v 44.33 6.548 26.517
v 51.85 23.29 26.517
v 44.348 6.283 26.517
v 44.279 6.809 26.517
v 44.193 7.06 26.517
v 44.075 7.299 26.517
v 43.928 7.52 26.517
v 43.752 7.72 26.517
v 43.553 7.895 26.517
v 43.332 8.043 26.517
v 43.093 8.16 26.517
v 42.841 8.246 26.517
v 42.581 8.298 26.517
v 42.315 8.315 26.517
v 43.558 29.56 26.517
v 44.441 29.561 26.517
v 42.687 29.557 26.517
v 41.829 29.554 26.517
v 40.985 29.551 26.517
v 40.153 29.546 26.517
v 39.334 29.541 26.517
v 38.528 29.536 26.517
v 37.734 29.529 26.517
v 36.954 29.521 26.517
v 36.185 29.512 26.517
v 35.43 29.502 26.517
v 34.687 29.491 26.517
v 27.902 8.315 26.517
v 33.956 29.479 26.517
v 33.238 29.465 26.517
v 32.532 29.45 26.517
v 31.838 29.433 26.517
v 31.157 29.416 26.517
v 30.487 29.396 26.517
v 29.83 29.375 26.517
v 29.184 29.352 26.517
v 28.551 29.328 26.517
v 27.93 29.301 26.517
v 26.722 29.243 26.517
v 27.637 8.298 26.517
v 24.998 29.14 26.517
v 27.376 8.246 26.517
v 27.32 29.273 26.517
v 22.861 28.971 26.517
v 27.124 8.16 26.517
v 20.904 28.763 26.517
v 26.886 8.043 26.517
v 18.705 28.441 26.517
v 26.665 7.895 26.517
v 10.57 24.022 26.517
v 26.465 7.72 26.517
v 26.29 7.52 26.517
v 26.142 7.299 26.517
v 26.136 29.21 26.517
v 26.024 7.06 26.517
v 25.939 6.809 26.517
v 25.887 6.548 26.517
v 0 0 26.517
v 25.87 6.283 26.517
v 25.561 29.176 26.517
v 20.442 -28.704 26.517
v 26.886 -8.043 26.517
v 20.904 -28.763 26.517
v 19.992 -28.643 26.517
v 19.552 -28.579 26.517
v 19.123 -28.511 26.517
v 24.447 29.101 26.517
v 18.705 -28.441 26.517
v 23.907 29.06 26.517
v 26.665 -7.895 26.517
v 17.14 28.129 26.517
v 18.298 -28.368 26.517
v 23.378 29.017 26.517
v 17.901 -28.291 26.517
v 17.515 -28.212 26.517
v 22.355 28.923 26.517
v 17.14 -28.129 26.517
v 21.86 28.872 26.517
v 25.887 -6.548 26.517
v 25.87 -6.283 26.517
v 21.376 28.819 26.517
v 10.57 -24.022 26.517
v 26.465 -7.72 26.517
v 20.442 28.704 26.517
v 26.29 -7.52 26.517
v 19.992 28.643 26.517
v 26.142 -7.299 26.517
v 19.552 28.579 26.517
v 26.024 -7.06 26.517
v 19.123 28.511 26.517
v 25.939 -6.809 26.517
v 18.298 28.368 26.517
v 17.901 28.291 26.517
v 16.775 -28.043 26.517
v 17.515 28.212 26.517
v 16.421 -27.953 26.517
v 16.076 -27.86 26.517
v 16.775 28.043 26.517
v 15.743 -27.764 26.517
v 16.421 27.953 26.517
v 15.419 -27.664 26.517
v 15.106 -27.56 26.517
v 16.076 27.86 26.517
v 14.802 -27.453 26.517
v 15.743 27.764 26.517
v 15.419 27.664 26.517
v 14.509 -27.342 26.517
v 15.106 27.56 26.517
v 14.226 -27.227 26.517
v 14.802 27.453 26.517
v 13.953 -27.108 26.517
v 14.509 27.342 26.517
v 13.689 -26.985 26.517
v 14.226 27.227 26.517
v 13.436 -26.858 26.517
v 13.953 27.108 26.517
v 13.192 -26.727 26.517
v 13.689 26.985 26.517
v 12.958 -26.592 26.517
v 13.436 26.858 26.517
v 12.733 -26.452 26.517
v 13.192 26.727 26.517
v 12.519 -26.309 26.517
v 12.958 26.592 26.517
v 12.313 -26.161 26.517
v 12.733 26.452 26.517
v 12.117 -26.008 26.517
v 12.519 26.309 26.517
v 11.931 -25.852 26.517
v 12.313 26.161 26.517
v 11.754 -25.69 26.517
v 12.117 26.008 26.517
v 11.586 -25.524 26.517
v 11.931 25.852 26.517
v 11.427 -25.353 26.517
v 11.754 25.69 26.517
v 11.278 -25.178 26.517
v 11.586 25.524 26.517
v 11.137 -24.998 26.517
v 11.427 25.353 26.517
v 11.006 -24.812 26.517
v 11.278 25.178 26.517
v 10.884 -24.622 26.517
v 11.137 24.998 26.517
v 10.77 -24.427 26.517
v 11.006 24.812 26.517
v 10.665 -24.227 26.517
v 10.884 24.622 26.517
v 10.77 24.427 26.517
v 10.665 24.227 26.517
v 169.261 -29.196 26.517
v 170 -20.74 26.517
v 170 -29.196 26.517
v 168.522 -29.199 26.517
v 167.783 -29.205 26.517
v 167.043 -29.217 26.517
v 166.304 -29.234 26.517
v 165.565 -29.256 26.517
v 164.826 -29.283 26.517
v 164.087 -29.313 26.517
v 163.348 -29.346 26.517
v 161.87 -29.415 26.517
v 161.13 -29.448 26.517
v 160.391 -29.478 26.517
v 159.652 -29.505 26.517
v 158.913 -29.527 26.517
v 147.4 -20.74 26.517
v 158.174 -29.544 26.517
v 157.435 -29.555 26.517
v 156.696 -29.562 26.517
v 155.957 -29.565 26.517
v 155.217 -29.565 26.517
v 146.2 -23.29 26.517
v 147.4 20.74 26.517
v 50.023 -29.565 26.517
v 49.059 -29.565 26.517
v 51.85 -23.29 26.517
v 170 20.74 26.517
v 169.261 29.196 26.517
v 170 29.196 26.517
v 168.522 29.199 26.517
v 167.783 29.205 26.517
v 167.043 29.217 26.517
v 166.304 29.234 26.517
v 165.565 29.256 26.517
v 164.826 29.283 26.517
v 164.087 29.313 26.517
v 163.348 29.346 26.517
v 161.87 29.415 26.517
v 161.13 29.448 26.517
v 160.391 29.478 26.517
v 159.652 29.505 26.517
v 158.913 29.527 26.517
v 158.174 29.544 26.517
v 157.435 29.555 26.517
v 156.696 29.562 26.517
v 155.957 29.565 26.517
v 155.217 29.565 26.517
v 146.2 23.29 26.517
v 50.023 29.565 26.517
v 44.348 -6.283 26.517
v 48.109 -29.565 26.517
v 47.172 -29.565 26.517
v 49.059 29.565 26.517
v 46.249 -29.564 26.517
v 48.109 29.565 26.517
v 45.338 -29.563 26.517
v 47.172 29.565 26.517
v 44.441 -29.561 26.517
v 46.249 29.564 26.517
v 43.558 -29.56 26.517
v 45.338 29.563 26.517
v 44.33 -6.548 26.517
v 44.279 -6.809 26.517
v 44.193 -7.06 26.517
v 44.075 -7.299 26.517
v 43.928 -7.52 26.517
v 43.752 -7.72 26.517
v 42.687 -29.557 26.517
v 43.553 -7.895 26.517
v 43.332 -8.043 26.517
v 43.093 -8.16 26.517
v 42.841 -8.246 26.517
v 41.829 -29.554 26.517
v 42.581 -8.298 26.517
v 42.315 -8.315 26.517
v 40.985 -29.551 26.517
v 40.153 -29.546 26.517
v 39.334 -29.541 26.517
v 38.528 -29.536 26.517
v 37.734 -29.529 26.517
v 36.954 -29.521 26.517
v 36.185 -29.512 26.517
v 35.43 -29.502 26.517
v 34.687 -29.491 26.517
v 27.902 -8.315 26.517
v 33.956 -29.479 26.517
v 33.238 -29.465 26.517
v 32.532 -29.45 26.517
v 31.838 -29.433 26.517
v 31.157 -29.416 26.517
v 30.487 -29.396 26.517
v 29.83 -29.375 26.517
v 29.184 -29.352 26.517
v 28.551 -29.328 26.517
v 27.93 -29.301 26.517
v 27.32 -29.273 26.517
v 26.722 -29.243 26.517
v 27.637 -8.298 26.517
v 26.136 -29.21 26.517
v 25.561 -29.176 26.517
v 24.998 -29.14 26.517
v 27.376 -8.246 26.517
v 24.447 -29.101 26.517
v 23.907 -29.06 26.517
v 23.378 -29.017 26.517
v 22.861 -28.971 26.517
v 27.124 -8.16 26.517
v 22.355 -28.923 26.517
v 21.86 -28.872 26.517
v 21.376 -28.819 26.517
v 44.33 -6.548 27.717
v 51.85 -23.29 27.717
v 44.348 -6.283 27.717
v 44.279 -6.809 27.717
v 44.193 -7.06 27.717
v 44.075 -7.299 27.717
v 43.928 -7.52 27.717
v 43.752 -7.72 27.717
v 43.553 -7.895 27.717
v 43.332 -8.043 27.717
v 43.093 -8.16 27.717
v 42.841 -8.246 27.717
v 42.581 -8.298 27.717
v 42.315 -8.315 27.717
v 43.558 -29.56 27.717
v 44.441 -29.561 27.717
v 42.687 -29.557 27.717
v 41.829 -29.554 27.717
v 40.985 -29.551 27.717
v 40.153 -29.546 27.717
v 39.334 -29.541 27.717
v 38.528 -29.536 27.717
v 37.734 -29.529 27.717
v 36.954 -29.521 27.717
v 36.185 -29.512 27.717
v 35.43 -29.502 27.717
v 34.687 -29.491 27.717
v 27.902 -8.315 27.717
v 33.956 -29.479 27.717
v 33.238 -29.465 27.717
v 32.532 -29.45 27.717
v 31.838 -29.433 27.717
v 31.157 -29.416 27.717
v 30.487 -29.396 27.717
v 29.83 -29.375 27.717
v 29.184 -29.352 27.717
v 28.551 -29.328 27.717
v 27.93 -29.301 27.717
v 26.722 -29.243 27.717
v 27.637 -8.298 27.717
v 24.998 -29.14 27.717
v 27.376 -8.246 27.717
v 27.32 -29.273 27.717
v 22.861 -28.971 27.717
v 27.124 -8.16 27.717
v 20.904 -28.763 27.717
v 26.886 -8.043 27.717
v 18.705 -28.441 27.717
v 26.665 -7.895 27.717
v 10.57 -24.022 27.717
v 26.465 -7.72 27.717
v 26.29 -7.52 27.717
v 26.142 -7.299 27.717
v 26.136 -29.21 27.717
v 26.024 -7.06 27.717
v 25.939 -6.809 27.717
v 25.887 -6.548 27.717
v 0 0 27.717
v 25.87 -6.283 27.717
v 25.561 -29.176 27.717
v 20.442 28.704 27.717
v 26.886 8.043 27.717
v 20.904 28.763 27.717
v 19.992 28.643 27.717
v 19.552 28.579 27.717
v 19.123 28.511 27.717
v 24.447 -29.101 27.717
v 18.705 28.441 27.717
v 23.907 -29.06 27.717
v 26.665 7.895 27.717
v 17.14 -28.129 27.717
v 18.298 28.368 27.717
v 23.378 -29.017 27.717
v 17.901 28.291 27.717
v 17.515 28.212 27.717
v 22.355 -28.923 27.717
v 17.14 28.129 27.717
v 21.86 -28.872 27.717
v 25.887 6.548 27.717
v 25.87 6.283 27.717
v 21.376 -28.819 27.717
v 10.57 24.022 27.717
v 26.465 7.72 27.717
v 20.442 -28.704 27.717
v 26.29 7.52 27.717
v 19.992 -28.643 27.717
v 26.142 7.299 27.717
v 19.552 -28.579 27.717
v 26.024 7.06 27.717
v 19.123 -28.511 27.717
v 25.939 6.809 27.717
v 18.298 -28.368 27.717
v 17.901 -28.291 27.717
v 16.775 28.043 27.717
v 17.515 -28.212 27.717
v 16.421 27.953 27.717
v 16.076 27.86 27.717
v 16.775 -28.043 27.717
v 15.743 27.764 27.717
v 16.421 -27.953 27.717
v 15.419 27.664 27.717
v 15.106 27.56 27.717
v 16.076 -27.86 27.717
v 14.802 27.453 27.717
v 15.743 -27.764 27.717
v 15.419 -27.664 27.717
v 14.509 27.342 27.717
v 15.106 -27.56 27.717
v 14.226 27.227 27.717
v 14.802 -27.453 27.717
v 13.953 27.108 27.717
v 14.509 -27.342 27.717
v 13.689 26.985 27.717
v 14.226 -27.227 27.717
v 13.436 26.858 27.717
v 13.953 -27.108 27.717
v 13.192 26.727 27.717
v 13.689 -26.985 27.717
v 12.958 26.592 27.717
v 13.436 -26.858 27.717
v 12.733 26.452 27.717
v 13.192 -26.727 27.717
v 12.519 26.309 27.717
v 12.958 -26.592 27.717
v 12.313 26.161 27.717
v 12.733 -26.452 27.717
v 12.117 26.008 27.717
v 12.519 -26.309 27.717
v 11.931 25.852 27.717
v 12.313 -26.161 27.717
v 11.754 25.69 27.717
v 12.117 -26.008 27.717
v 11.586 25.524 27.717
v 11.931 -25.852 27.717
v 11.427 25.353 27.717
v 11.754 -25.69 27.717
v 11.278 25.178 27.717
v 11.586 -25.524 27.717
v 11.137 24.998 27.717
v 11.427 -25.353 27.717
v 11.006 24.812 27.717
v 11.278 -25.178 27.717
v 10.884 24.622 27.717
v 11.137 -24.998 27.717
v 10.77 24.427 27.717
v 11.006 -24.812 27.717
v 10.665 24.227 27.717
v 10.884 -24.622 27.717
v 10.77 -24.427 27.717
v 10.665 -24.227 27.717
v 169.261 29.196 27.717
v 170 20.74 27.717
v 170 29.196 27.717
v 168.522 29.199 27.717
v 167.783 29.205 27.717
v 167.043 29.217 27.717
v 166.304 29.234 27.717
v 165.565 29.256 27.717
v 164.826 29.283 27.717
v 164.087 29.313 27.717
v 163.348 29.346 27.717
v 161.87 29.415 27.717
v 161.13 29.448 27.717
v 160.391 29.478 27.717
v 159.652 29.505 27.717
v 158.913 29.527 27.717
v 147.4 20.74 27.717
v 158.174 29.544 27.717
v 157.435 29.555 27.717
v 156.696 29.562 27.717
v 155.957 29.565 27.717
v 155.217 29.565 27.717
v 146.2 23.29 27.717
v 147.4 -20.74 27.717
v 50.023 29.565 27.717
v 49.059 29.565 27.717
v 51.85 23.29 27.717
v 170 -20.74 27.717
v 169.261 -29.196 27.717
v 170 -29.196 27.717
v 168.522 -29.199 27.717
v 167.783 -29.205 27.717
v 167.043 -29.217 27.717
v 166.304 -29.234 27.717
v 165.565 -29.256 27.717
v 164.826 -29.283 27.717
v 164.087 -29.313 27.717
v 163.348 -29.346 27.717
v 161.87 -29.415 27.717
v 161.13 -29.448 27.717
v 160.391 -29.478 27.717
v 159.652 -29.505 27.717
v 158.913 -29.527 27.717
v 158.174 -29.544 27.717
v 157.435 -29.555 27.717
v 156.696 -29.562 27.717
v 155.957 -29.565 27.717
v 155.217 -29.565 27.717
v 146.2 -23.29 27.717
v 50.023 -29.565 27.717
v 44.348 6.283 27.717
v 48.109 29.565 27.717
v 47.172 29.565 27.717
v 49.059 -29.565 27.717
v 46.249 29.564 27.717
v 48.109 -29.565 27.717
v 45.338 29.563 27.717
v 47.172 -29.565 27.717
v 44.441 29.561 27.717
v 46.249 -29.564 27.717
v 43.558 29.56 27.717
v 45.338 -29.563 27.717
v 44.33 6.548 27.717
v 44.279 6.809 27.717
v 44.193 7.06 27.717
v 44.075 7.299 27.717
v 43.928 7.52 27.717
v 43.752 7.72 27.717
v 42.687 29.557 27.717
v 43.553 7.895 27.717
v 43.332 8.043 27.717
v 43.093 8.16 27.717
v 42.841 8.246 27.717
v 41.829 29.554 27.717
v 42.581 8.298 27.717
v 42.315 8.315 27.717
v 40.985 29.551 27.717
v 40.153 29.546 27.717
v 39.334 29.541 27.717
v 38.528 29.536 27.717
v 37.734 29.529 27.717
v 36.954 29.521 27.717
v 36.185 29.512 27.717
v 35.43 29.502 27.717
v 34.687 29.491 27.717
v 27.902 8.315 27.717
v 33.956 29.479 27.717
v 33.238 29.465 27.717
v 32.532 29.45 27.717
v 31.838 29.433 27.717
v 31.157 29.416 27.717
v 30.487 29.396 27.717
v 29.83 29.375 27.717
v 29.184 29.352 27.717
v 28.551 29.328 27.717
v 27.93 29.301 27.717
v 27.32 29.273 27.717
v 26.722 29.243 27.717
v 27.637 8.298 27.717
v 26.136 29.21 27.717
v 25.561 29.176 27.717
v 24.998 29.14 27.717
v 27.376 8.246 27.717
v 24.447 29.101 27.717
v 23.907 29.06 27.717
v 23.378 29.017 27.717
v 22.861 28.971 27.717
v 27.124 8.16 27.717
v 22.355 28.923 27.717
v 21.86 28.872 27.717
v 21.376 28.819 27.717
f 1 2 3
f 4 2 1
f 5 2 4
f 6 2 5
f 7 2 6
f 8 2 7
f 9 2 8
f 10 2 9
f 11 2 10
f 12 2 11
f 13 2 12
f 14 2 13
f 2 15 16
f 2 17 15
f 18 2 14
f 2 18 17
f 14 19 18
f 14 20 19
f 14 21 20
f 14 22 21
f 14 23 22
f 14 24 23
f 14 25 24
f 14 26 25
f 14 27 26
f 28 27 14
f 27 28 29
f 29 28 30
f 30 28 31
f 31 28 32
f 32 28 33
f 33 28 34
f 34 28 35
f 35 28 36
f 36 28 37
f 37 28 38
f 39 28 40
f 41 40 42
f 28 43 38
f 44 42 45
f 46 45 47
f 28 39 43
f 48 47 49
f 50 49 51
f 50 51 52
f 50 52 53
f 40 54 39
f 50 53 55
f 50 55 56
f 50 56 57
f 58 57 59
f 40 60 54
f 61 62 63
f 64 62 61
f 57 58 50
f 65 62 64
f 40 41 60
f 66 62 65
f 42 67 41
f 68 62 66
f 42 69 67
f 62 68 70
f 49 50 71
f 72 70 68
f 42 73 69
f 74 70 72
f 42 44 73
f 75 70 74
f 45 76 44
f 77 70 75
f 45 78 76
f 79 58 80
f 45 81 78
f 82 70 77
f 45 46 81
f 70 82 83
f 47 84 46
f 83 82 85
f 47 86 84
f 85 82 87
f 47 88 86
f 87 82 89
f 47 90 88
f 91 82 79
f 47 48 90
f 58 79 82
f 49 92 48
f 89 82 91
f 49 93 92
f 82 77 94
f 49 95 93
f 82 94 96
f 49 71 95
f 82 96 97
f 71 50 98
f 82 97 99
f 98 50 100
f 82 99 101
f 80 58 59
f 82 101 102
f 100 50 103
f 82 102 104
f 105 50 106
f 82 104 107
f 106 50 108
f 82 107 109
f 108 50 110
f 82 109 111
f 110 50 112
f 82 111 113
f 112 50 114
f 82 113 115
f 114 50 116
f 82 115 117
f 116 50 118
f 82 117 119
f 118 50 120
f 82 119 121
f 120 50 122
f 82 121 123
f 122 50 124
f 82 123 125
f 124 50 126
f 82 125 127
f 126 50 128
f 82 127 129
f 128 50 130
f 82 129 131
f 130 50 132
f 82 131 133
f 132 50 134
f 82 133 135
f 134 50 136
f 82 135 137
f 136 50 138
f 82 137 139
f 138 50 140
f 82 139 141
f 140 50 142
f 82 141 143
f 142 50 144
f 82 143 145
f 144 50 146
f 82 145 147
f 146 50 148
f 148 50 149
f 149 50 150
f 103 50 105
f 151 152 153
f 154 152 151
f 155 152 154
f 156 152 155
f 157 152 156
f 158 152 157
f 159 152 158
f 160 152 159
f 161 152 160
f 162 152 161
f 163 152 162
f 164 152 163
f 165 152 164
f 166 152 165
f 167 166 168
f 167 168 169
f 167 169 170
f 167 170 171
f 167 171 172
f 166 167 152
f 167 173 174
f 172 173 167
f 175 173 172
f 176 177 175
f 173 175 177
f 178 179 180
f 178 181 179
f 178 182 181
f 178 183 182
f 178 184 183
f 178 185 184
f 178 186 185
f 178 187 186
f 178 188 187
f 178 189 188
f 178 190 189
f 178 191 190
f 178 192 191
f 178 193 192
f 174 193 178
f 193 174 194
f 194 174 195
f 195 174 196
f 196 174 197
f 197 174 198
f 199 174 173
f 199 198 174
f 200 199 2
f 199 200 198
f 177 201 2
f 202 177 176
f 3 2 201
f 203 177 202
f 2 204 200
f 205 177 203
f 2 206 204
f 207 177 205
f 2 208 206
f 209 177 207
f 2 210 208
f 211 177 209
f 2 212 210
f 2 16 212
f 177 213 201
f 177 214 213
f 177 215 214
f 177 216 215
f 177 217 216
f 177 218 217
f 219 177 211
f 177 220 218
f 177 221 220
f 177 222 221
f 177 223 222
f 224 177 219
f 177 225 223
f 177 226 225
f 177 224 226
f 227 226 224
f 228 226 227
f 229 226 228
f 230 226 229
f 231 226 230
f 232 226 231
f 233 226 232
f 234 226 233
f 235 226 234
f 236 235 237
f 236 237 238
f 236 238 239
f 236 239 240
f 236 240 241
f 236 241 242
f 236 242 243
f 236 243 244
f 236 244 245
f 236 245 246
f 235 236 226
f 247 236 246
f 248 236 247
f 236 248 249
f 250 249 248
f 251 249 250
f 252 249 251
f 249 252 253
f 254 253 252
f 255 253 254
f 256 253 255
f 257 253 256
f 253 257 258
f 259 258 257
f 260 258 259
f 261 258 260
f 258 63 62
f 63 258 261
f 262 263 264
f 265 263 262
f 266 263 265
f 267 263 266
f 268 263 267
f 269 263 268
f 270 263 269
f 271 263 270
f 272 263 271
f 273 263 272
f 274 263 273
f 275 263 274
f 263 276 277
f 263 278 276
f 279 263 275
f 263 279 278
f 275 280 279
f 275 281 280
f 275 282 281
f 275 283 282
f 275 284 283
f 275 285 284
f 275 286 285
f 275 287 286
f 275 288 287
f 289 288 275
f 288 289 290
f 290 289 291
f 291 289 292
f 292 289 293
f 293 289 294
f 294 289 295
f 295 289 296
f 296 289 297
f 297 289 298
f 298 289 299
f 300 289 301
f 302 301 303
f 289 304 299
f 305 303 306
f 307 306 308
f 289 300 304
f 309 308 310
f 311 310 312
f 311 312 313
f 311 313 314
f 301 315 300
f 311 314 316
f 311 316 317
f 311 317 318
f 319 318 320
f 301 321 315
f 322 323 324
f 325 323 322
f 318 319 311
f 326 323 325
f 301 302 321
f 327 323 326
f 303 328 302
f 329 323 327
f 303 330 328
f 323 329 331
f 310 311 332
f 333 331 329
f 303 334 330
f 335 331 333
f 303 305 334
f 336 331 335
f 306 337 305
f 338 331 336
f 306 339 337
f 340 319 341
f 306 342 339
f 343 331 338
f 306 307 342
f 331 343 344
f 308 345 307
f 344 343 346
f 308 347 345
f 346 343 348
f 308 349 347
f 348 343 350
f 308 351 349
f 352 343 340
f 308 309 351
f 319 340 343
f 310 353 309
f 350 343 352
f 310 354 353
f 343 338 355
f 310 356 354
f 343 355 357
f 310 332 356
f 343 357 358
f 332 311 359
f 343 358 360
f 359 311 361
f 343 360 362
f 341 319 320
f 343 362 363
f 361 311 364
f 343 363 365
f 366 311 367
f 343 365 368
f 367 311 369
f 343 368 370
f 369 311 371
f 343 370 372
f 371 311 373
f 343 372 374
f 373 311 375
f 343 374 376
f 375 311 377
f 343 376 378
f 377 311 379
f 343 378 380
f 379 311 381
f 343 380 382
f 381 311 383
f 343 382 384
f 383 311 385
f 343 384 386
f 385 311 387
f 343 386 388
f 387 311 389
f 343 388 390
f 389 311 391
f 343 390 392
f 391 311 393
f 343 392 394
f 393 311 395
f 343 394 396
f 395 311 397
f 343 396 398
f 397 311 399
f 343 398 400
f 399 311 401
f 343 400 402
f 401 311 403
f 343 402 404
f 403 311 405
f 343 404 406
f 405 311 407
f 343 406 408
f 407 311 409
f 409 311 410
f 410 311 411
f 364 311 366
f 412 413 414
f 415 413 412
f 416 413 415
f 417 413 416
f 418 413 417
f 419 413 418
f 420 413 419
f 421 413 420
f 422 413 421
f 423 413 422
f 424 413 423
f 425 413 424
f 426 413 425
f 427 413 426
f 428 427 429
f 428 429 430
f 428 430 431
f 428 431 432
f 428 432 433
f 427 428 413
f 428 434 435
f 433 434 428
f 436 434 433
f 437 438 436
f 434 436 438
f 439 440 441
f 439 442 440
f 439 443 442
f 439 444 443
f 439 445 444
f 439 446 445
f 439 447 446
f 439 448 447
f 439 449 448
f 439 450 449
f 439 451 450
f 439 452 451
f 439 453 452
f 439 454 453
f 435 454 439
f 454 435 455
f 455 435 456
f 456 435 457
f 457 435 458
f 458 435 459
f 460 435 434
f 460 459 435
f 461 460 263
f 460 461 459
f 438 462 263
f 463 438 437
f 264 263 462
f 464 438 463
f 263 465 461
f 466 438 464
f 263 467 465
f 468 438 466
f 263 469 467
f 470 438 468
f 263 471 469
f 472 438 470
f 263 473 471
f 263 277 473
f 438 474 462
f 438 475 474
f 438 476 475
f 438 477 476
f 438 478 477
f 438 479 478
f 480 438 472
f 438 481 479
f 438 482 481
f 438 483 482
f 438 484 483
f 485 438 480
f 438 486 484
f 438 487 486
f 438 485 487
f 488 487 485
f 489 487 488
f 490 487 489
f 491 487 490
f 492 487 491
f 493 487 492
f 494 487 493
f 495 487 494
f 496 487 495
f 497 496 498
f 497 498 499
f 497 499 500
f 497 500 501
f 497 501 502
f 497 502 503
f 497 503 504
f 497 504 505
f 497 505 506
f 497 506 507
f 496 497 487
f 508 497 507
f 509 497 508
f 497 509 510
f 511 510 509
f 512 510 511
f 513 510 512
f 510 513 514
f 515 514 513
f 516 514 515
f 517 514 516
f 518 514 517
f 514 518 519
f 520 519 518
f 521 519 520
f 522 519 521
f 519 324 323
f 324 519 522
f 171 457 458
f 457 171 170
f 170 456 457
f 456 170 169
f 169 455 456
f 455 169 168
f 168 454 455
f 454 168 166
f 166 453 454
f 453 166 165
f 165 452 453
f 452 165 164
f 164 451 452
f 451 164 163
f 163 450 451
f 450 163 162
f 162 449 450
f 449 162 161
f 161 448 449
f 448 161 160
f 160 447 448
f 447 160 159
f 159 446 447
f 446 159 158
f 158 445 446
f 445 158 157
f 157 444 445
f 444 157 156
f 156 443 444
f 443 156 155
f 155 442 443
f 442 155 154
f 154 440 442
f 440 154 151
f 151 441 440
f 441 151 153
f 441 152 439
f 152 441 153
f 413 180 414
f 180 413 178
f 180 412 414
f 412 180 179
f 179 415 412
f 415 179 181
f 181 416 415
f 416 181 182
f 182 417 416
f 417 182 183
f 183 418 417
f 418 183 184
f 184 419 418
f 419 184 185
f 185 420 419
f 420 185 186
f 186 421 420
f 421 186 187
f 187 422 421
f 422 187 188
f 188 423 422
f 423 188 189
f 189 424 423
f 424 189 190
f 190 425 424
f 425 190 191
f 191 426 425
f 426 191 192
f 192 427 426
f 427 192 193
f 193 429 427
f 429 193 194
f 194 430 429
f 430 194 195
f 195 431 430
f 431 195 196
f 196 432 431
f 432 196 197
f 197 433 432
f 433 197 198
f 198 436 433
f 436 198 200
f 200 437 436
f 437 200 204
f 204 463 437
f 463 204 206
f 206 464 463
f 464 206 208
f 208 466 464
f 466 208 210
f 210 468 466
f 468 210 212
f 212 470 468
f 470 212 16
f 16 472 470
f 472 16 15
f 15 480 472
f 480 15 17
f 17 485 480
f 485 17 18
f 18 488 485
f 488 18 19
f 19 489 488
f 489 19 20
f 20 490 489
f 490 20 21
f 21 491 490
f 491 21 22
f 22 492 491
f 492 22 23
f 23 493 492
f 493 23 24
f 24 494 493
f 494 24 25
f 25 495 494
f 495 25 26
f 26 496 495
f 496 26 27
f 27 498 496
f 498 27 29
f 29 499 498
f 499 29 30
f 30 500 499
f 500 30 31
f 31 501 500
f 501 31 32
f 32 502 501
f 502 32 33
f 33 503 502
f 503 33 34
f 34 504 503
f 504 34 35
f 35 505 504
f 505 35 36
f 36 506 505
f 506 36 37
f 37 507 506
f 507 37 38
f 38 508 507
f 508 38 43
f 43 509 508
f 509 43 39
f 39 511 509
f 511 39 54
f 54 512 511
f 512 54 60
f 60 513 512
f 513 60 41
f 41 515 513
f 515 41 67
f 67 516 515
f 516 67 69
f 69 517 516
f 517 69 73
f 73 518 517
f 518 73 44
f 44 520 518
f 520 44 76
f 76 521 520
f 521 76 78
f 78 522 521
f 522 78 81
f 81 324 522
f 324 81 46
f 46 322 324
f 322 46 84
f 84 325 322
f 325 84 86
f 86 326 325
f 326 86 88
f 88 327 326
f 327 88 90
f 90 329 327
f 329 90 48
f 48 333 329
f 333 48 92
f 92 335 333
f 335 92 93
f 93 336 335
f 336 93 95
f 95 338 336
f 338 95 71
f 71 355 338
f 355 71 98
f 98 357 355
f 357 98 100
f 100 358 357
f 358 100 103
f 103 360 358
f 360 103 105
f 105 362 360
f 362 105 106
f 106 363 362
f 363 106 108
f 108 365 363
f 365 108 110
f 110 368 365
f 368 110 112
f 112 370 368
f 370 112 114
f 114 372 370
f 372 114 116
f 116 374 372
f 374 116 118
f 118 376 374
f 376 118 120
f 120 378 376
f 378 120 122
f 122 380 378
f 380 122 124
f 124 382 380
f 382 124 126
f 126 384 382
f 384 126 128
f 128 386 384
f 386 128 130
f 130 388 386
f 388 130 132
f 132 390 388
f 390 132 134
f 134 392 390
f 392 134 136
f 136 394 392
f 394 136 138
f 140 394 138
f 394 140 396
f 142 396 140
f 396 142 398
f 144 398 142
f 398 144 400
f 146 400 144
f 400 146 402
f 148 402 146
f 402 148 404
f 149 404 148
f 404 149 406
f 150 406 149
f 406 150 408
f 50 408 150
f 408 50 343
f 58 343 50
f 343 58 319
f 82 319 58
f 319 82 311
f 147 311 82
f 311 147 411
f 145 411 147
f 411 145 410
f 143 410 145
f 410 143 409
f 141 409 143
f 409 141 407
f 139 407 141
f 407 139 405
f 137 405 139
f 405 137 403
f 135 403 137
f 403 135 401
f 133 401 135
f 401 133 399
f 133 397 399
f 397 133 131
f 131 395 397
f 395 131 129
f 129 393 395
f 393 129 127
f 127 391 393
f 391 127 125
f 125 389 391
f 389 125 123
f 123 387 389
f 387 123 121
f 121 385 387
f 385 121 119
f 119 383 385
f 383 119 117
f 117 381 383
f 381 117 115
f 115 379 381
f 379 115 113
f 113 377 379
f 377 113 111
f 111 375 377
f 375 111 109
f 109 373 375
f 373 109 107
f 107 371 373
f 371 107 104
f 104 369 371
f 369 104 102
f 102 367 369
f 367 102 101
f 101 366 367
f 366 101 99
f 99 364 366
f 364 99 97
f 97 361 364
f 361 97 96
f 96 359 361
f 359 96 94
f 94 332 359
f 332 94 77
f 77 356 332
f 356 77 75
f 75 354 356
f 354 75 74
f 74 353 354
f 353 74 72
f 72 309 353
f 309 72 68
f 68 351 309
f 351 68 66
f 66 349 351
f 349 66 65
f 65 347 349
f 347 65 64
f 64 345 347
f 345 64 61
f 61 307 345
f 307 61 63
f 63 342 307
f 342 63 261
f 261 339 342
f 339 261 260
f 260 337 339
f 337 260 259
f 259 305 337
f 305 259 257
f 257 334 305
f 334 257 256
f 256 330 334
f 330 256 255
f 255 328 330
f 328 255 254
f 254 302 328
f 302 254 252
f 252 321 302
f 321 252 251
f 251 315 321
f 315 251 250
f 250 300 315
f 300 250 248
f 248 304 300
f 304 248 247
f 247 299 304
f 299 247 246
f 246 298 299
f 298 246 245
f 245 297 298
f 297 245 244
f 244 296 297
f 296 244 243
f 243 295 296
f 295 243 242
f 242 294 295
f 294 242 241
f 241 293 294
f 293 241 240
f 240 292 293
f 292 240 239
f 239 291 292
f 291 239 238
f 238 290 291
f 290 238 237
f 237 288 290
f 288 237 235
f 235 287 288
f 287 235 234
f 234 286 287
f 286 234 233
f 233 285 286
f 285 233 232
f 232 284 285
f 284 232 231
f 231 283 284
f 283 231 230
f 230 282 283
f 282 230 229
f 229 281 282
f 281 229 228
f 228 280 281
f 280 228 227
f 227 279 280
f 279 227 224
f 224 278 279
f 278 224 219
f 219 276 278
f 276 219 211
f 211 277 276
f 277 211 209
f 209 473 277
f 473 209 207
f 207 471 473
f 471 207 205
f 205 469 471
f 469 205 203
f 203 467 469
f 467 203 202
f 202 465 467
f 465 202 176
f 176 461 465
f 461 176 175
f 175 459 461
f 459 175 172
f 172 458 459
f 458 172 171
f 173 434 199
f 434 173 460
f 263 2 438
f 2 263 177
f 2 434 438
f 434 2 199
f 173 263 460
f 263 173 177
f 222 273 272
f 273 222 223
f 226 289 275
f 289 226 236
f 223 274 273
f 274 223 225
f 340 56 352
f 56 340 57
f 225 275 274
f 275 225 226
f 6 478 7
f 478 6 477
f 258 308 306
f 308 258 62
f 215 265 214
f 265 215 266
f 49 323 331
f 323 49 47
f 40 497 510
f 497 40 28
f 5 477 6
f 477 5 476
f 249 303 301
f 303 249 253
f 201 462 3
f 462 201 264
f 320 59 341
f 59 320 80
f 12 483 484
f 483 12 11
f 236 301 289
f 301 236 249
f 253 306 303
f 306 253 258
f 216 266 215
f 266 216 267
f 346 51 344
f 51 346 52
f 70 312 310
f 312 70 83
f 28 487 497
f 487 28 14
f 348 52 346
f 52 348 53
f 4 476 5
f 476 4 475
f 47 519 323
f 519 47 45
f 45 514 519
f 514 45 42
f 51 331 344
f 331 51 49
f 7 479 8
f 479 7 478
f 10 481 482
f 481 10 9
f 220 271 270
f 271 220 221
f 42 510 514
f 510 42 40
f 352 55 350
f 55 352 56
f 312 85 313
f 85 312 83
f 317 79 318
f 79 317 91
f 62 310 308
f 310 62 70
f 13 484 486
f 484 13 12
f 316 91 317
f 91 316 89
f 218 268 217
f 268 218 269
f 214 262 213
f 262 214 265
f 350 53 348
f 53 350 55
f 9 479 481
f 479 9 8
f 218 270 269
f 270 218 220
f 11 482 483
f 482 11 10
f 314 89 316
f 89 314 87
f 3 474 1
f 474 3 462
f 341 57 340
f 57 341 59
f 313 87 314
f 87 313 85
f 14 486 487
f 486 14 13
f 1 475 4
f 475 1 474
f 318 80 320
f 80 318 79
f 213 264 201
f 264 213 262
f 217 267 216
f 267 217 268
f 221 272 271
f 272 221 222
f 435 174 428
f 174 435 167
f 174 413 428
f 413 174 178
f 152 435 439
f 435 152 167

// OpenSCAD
// Sarepta hull study, 170 mm overall. Units in the station table are full-size mm.
// See README.md for source provenance and reconstruction limitations.
length_mm = 170;
wall_mm = 1.2;
transom_mm = 2.0;
deck_mm = 1.2;
rim_fullsize_mm = 50;
hatch_length_fullsize_mm = 500;
hatch_width_fullsize_mm = 450;
hatch_center_fullsize_mm = 950;
hatch_radius_fullsize_mm = 55;
part = "hull"; // [hull, outer, inner, sections]
station_steps = 12;

scale_factor = length_mm / 4600;
// x runs from bow to stern; y is transverse; z is above the keel baseline.
// Rows: x, then [y,z] for keel, three bottom samples, tunnel crown,
// outer chine, sheer, and deck centre. Stations 1..5 follow the 1974 body plan.
// Longitudinal positions, stem closure and sheer fairing are reconstructed.
// A separate continuous planar foredeck covers the three underlying bows.
stations = [
 [0, [[0,750],[96,750],[192,750],[288,750],[384,750],[625,750],[702,750],[0,750]]],
 [460, [[0,220],[96,325],[192,433],[288,560],[384,687],[625,506],[702,735],[0,790]]],
 [920, [[0,33],[108,92],[216,169],[324,271],[432,383],[640,270],[790,750],[0,802]]],
 [1380,[[0,0],[110,35],[219,76],[329,135],[438,211],[640,136],[800,750],[0,794]]],
 [1840,[[0,0],[110,28],[219,61],[329,99],[438,142],[640,105],[800,750],[0,780]]],
 [2300,[[0,0],[110,27],[219,53],[329,80],[438,105],[650,100],[800,750],[0,770]]],
 [3067,[[0,0],[110,16.4],[219,32.7],[329,49.2],[438,65.5],[650,97.2],[800,750],[0,765]]],
 [4200,[[0,0],[110,16.4],[219,32.7],[329,49.2],[438,65.5],[650,97.2],[800,750],[0,765]]],
 [4600,[[0,0],[110,16.4],[219,32.7],[329,49.2],[438,65.5],[650,97.2],[790,750],[0,765]]]
];

function d(i,j,k) = (stations[i+1][1][j][k]-stations[i][1][j][k]) /
                         (stations[i+1][0]-stations[i][0]);
function tangent(i,j,k) =
 i==0 ? d(0,j,k) : i==len(stations)-1 ? d(i-1,j,k) :
 let(a=d(i-1,j,k), b=d(i,j,k)) a*b<=0 ? 0 :
 sign(a)*min(abs((a+b)/2),2*abs(a),2*abs(b));
function blend(i,t,j,k) = let(h=stations[i+1][0]-stations[i][0])
 (2*t*t*t-3*t*t+1)*stations[i][1][j][k] +
 (t*t*t-2*t*t+t)*h*tangent(i,j,k) +
 (-2*t*t*t+3*t*t)*stations[i+1][1][j][k] +
 (t*t*t-t*t)*h*tangent(i+1,j,k);
function half_section(i,t) = [for(j=[0:7])
 [blend(i,t,j,0)*scale_factor,blend(i,t,j,1)*scale_factor]];
function outer_ring(p) = concat(
 [for(j=[6:-1:1]) [-p[j][0],p[j][1]]],
 [for(j=[0:7]) p[j]]);
function cross2(a,b) = a[0]*b[1]-a[1]*b[0];
function normal(v) = [-v[1],v[0]]/norm(v);
// Mitered inward offset of the open bottom/side polyline in the YZ plane.
function inset(p,j,w) =
 j==0 ? p[j]+w*normal(p[1]-p[0]) :
 j==len(p)-1 ? p[j]+w*normal(p[j]-p[j-1]) :
 let(a=p[j]-p[j-1],b=p[j+1]-p[j],na=normal(a),nb=normal(b),
     den=cross2(a,b))
 abs(den)<0.000001 ? p[j]+w*na :
 p[j]+w*na+a*(cross2(w*(nb-na),b)/den);
function inner_ring(p) = let(bottom=concat(
 [for(j=[6:-1:1]) [-p[j][0],p[j][1]]],
 [for(j=[0:6]) p[j]]), q=[for(j=[0:len(bottom)-1]) inset(bottom,j,wall_mm)])
 concat(q,[[q[len(q)-1][0],60],[q[0][0],60]]);

// Convex quintic Bezier guide curves: centre stem, tunnel crown, outboard stem.
// All three have horizontal first and second derivatives at the aft endpoint.
// Full-size reconstruction coordinates, fitted approximately to the body plan.
function shifted_controls(p,start) = [for(q=p)
    [p[5][0]-(p[5][0]-q[0])*(p[5][0]-start)/(p[5][0]-p[0][0]),q[1]]];
// A 50 mm perpendicular setback also continues along the two straight bow edges.
bow_inset_x=rim_fullsize_mm*sqrt(1+0.44*0.44);
guide_controls = [
    shifted_controls([[0,750],[0,498.735739],[298.958581,241.850206],
        [818.67287,0],[930.073765,0],[1380,0]],bow_inset_x),
    [[464.0,750.0],[464.0,744.834548],[1073.113065,200.924939],
        [1373.660044,65.5],[2754.543723,65.5],[3067.0,65.5]],
    shifted_controls([[295,750],[295,638.784365],[886.016721,290.176633],
        [1217.401932,97.2],[1485.812619,97.2],[2300,97.2]],0.44*625+bow_inset_x)
];
function bezier5(p,t) = pow(1-t,5)*p[0]+5*pow(1-t,4)*t*p[1]+
    10*pow(1-t,3)*t*t*p[2]+10*pow(1-t,2)*pow(t,3)*p[3]+
    5*(1-t)*pow(t,4)*p[4]+pow(t,5)*p[5];
function curve_parameter(p,x,lo=0,hi=1,n=0) = x<=p[0][0] ? 0 : x>=p[5][0] ? 1 :
    n==34 ? (lo+hi)/2 :
    let(t=(lo+hi)/2) bezier5(p,t)[0]<x ? curve_parameter(p,x,t,hi,n+1) :
    curve_parameter(p,x,lo,t,n+1);
function smooth5(t) = let(u=max(0,min(1,t))) u*u*u*(10-15*u+6*u*u);
function guide_point(k,r) = let(p=guide_controls[k],start=p[0][0],end=p[5][0],
    x=r<end ? start+(end-start)*r/end : r,
    z=r<end ? bezier5(p,curve_parameter(p,x))[1] : p[5][1],
    y=k==0?0 : k==1?384+54*smooth5(r/1380) : 625+25*(1-pow(1-min(r/2300,1),3)))
    [x,y,z];
// One convex cubic shoulder replaces the S-shaped plan-view sheer.
// The deck edge is the master curve; the hull sheer is its normal inward offset.
shoulder_controls=[[286,650],[352,800],[670,800],[1380,800]];
function cubic(p,t) = pow(1-t,3)*p[0]+3*pow(1-t,2)*t*p[1]+
    3*(1-t)*t*t*p[2]+pow(t,3)*p[3];
function cubic_tangent(p,t) = 3*(pow(1-t,2)*(p[1]-p[0])+
    2*(1-t)*t*(p[2]-p[1])+t*t*(p[3]-p[2]));
function shoulder_inner(t) = let(p=cubic(shoulder_controls,t),
    v=cubic_tangent(shoulder_controls,t))
    p+rim_fullsize_mm*[v[1],-v[0]]/norm(v);
function sheer_point(r) = let(p=r<1380 ? shoulder_inner(r/1380) :
    [r, r<4200 ? 800-rim_fullsize_mm :
    800-rim_fullsize_mm-10*smooth5((r-4200)/400)]) [p[0],p[1],750];
function half_surface(r,k,g) = let(c=g[0],t=g[1],b=g[2],s=g[3])
    k<=16 ? let(u=k/16,v=u*(1-0.14*(1-smooth5(r/2300))*(1-u)),p=c+(t-c)*v)
        [p[0],c[1]+(t[1]-c[1])*u,p[2]] :
    k<=20 ? t+(b-t)*(k-16)/4 : b+(s-b)*(k-20)/4;
function fair_bottom(r,j,g) = let(k=abs(j-24),p=half_surface(r,k,g))
    [p[0]*scale_factor,(j<24?-p[1]:p[1])*scale_factor,p[2]*scale_factor];

// Share the final exterior grid with the cavity so plan edits cannot expose it.
fair_rows=concat([for(i=[0:180]) 3067*i/180],
    [for(i=[1:36]) 3067+(4600-3067)*i/36]);
fair_guides=[for(r=fair_rows) [guide_point(0,r),guide_point(1,r),guide_point(2,r),sheer_point(r)]];
fair_points=[for(i=[0:len(fair_rows)-1],j=[0:48])
    fair_bottom(fair_rows[i],j,fair_guides[i])];

rings = concat([for(i=[0:len(stations)-2]) let(steps=i==0?48:station_steps)
    for(s=[0:steps-1])
 [ (stations[i][0]+(stations[i+1][0]-stations[i][0])*s/steps)*scale_factor,
   half_section(i,s/steps)]],
 [[length_mm,[for(p=stations[len(stations)-1][1]) p*scale_factor]]]);

// The bottom surface retains its three bow edges. A separate planar sheet
// closes their upper gaps and creates the continuous deck outline.
function top_index(i,j,m,n) = (i==0 || j==0 || j==n-1) ? i*n+j :
    m*n+(i-1)*(n-2)+j-1;
module loft(inner=false) {
    rr = inner ? [for(r=rings) if(r[0]>=length_mm*0.15) [r[0],inner_ring(r[1])]] :
                 [for(r=rings) [r[0],outer_ring(r[1])]];
    m=len(rr);
    if(inner) {
        cavity=[for(i=[0:len(fair_rows)-1]) if(fair_rows[i]>=690)
            let(b=[for(j=[0:48]) fair_points[i*49+j]],
                yz=[for(p=b) [p[1],p[2]]],
                q=[for(j=[0:48]) inset(yz,j,wall_mm)])
            concat([for(j=[0:48]) [b[j][0],q[j][0],q[j][1]]],
                   [[b[48][0],q[48][0],60],[b[0][0],q[0][0],60]])];
        n=len(cavity[0]);m=len(cavity);
        pp=[for(row=cavity,p=row) p];
        ff=concat([[for(j=[n-1:-1:0]) j]],
            [for(i=[0:m-2],j=[0:n-1]) each
             [[i*n+j,i*n+(j+1)%n,(i+1)*n+(j+1)%n],
              [i*n+j,(i+1)*n+(j+1)%n,(i+1)*n+j]]],
            [[for(j=[0:n-1]) (m-1)*n+j]]);
        polyhedron(points=pp,faces=[for(f=ff) [for(j=[len(f)-1:-1:0]) f[j]]],convexity=12);
    } else {
        n=49;
        outer_rows=fair_rows;
        m=len(outer_rows);
        bottom=fair_points;
        top=[for(i=[1:m-1],j=[1:n-2]) let(p=bottom[i*n+j])
            [p[0],p[1],750*scale_factor]];
        ff=concat(
            [for(i=[0:m-2],j=[0:n-2]) each
                [[i*n+j,i*n+j+1,(i+1)*n+j+1],
                 [i*n+j,(i+1)*n+j+1,(i+1)*n+j]]],
            [for(i=[0:m-2],j=[0:n-2]) let(
                a=top_index(i,j,m,n),b=top_index(i,j+1,m,n),
                c=top_index(i+1,j,m,n),d=top_index(i+1,j+1,m,n)) each
                [[a,c,d],[a,d,b]]],
            [concat([for(j=[0:n-1]) (m-1)*n+j],
                    [for(j=[n-2:-1:1]) top_index(m-1,j,m,n)])]);
        polyhedron(points=concat(bottom,top),
            faces=[for(f=ff) [for(j=[len(f)-1:-1:0]) f[j]]],convexity=12);
    }
}

// Photo-matched plan rake: approximately 24 degrees per front edge, giving
// a 132-degree included angle. The tunnels remain below this planar sheet.
function deck_outline() = let(half=concat(
    [[0,0],[79.2,180],[162.8,370],[233.2,530],[286,650]],
    [for(i=[1:80]) cubic(shoulder_controls,i/80)],
    [[4200,800]],
    [for(i=[1:20]) [4200+400*i/20,800-10*smooth5(i/20)]]))
    concat([for(p=half) p*scale_factor],
        [for(i=[len(half)-1:-1:1]) [half[i][0]*scale_factor,-half[i][1]*scale_factor]]);
module foredeck_sheet() {
    translate([0,0,750*scale_factor-deck_mm])
        linear_extrude(height=deck_mm) polygon(deck_outline());
}
module exterior() { union() { loft(); foredeck_sheet(); } }

// Rounded rectangular opening into the bow locker, through the deck only.
module hatch_opening() {
    r=hatch_radius_fullsize_mm*scale_factor;
    translate([hatch_center_fullsize_mm*scale_factor,0,
               750*scale_factor-deck_mm-0.05])
        linear_extrude(height=deck_mm+0.1)
            offset(r=r,$fn=48)
                square([(hatch_length_fullsize_mm-2*hatch_radius_fullsize_mm)*scale_factor,
                        (hatch_width_fullsize_mm-2*hatch_radius_fullsize_mm)*scale_factor],center=true);
}

// The cavity follows the same guide grid as the exterior after each plan edit.
module safe_inner() { loft(true); }

module hull() {
    difference() {
        exterior();
        // Retain side decks, the hatch-bearing foredeck, and an aft well bulkhead.
        intersection() {
            safe_inner();
            union() {
                intersection() {
                    translate([0,0,-deck_mm]) exterior();
                    translate([length_mm*0.15,-40,-1])
                        cube([length_mm*0.71,80,62]);
                }
                translate([length_mm*0.305,-length_mm*0.137,-1])
                    cube([length_mm*0.555,length_mm*0.274,62]);
            }
        }
        hatch_opening();
        // Original-style motor well: low central transom, high aft quarters.
        // The well floor is sealed, with a full-height forward bulkhead.
        translate([length_mm*0.86+wall_mm,-length_mm*0.122,8.0*length_mm/170])
            cube([length_mm*0.14-transom_mm-wall_mm,length_mm*0.244,55]);
        translate([length_mm-transom_mm-0.01,-length_mm*0.122,400*scale_factor])
            cube([transom_mm+0.1,length_mm*0.244,55]);
    }
}

assert(length_mm>=80 && length_mm<=180,"Expected an 80..180 mm model.");
assert(wall_mm>=0.8 && wall_mm<=2,"Wall thickness outside the studied range.");
if(part=="hull") color([0.72,0.77,0.79]) hull();
else if(part=="outer") exterior();
else if(part=="inner") safe_inner();
else if(part=="sections")
    for(i=[1:len(stations)-1])
        translate([stations[i][0]*scale_factor,0,0])
            rotate([90,0,90]) linear_extrude(height=0.25)
                polygon(outer_ring([for(p=stations[i][1]) p*scale_factor]));
else assert(false,"Unknown part selector.");
